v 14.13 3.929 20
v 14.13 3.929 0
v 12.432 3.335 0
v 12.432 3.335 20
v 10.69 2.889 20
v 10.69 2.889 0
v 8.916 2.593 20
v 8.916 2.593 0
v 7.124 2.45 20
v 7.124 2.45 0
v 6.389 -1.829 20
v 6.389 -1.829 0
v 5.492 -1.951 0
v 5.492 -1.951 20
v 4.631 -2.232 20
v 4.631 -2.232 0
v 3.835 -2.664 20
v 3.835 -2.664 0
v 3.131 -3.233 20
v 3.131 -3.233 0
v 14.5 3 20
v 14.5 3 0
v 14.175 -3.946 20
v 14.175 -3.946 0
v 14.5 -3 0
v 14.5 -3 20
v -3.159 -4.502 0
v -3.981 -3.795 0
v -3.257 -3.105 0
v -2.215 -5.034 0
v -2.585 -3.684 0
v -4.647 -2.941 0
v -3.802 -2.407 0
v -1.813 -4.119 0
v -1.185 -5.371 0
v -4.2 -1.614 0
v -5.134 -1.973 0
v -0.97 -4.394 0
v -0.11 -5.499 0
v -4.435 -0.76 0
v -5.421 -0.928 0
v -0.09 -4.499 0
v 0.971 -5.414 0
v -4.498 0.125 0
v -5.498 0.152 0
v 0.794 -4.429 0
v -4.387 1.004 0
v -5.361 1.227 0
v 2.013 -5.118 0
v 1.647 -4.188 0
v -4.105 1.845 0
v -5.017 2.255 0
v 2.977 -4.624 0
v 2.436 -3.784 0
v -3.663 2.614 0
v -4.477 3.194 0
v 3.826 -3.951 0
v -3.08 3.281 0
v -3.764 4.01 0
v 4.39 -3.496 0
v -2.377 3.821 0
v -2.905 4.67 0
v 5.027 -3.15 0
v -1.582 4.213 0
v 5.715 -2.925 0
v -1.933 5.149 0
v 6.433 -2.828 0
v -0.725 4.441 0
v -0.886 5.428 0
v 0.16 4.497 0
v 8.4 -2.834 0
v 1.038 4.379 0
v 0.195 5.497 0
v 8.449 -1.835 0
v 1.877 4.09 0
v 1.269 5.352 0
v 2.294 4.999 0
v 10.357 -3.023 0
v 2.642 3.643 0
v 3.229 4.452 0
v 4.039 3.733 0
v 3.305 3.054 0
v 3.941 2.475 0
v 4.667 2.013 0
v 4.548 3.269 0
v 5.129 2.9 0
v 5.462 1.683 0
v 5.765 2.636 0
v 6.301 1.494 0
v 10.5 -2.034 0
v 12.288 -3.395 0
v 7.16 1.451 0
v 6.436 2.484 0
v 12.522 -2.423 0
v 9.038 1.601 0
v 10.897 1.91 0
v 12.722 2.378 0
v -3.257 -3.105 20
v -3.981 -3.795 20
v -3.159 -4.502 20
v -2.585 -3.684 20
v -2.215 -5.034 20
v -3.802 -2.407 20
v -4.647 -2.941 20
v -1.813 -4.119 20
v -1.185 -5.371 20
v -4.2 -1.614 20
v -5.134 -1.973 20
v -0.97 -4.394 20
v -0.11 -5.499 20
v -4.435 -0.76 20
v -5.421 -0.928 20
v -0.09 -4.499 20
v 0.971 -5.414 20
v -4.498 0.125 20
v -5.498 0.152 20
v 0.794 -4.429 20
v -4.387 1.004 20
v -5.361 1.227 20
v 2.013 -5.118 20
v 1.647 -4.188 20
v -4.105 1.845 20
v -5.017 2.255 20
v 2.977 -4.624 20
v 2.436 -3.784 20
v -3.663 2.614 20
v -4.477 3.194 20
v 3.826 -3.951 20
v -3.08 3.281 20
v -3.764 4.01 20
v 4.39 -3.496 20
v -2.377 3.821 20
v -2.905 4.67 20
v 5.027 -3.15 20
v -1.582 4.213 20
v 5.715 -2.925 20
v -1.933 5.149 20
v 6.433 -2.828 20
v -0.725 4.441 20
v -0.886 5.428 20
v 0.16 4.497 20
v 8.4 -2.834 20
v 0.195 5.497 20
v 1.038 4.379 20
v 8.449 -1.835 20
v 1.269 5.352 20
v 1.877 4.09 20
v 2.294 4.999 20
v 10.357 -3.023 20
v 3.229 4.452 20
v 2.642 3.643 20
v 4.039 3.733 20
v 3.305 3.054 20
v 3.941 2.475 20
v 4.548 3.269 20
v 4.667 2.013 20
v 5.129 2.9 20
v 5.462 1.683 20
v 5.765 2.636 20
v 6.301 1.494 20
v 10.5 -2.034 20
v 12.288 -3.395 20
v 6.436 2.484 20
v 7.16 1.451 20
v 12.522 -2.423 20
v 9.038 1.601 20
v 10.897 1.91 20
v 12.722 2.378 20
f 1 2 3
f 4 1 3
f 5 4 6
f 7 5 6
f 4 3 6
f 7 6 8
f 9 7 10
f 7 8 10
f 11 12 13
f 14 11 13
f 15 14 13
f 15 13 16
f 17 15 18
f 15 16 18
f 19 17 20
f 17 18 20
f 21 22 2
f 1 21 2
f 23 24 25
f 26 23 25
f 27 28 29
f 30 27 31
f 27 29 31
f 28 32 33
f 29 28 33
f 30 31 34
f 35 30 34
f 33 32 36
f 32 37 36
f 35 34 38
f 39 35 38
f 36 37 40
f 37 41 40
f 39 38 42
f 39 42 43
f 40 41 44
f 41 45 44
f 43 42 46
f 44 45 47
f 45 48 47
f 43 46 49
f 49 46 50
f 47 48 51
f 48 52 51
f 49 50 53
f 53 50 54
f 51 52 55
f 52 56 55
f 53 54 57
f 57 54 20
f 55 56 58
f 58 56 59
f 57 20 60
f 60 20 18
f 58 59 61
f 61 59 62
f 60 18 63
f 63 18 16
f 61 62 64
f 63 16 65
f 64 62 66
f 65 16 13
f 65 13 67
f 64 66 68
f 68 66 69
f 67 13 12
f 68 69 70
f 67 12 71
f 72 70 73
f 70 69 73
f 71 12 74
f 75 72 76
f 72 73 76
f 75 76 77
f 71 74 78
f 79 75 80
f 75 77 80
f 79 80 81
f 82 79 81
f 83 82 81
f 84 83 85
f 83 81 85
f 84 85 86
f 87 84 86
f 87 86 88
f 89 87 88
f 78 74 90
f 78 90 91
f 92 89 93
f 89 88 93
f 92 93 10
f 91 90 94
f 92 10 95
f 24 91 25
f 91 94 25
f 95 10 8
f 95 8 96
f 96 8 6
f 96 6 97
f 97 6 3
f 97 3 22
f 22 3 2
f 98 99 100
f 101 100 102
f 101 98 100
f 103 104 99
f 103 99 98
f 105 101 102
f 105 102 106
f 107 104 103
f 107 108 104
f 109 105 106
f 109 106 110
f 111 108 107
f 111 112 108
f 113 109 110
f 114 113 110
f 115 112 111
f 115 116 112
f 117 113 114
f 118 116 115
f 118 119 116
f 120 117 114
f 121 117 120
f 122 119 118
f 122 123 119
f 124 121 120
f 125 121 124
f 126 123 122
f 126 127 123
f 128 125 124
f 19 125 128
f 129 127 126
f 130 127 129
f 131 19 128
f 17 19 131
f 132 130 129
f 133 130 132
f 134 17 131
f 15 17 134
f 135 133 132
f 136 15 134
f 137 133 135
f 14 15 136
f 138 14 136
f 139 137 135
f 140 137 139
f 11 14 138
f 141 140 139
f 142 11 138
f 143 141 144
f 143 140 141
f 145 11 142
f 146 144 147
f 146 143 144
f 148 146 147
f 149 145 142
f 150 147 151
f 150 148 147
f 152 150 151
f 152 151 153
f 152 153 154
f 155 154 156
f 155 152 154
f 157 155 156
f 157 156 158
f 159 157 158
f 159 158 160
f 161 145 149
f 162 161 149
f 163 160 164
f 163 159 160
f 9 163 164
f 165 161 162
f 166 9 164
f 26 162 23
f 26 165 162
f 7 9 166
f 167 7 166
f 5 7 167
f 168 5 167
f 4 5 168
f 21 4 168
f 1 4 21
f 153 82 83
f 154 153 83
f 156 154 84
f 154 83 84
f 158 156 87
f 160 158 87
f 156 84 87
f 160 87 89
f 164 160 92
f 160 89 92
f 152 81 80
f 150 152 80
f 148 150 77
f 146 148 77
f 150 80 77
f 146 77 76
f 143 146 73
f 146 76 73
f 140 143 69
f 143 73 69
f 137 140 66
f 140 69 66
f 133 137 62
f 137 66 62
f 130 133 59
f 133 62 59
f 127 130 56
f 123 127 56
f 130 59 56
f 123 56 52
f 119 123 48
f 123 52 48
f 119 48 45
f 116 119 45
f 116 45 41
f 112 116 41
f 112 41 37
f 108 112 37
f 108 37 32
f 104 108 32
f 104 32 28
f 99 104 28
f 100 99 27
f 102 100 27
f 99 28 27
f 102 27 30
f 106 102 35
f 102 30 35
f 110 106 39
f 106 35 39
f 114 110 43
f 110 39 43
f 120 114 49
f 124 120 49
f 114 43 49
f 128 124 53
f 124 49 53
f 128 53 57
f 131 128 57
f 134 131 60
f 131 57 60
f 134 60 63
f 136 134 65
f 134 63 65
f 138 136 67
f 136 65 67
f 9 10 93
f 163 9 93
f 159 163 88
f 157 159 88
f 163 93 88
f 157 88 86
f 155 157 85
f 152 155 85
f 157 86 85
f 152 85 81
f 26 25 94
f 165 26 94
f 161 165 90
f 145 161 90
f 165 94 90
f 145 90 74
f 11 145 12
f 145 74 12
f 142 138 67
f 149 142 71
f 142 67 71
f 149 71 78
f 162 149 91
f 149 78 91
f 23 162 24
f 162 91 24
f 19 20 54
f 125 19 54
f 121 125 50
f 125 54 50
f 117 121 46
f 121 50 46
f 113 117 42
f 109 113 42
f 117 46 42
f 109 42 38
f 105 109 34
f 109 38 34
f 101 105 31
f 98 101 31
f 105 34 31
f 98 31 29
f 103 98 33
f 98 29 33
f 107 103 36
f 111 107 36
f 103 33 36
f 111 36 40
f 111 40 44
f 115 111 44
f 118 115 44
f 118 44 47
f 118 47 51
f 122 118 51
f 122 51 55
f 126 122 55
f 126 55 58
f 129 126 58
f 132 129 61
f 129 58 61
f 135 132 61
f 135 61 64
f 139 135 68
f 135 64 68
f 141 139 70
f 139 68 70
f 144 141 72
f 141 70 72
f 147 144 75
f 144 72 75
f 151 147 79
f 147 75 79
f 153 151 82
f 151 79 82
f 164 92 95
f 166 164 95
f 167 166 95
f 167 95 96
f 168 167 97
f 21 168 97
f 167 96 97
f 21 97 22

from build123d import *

# Parameters (mm, degrees)
F1_DEPTH = 20


with BuildPart() as f1:
    # F0 (on Top) → F1 (new body)
    with BuildSketch(Plane.XY):
        with BuildLine():
            ThreePointArc((3.130612, -3.232533), (-4.498272, 0.124691), (3.304876, 3.054143))
            ThreePointArc((3.304876, 3.054143), (5.057214, 1.830866), (7.160258, 1.450997))
            ThreePointArc((7.160258, 1.450997), (10.896637, 1.91036), (14.5, 3))
            Line((14.5, 3), (14.129716, 3.928919))
            ThreePointArc((14.129716, 3.928919), (10.690142, 2.888807), (7.123599, 2.450325))
            ThreePointArc((7.123599, 2.450325), (5.441163, 2.75422), (4.039293, 3.732842))
            ThreePointArc((4.039293, 3.732842), (-5.497888, 0.1524), (3.826303, -3.950874))
            ThreePointArc((3.826303, -3.950874), (5.026855, -3.150465), (6.43329, -2.828101))
            ThreePointArc((6.43329, -2.828101), (10.356786, -3.023299), (14.175279, -3.94581))
            Line((14.175279, -3.94581), (14.5, -3))
            ThreePointArc((14.5, -3), (10.499674, -2.03356), (6.389346, -1.829067))
            ThreePointArc((6.389346, -1.829067), (4.631302, -2.232022), (3.130612, -3.232533))
        make_face()
    extrude(amount=F1_DEPTH)


solid = f1.part
